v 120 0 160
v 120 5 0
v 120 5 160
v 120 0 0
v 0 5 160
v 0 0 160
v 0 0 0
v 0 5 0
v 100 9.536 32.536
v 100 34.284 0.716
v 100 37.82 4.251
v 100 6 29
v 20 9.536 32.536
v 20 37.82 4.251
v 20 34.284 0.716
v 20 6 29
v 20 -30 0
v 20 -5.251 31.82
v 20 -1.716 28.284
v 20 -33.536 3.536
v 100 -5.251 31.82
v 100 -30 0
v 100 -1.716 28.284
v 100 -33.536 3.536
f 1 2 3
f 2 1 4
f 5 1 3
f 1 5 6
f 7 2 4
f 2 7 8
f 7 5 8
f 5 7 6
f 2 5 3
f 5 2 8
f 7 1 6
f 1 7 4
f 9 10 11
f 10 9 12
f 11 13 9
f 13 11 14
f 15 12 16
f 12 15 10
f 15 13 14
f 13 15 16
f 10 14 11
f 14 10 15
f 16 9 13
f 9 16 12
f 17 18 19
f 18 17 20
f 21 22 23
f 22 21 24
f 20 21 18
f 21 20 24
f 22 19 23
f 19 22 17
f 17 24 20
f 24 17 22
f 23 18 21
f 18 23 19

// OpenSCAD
translate([0,0,0]) cube([120,5,160]);
translate([20,6,29]) rotate([-45,0,0]) cube([80,40,5]);
translate([20,-30,0]) rotate([45,0,0]) cube([80,40,5]);
*translate([0,-45,0]) cube([120,90,1]);
